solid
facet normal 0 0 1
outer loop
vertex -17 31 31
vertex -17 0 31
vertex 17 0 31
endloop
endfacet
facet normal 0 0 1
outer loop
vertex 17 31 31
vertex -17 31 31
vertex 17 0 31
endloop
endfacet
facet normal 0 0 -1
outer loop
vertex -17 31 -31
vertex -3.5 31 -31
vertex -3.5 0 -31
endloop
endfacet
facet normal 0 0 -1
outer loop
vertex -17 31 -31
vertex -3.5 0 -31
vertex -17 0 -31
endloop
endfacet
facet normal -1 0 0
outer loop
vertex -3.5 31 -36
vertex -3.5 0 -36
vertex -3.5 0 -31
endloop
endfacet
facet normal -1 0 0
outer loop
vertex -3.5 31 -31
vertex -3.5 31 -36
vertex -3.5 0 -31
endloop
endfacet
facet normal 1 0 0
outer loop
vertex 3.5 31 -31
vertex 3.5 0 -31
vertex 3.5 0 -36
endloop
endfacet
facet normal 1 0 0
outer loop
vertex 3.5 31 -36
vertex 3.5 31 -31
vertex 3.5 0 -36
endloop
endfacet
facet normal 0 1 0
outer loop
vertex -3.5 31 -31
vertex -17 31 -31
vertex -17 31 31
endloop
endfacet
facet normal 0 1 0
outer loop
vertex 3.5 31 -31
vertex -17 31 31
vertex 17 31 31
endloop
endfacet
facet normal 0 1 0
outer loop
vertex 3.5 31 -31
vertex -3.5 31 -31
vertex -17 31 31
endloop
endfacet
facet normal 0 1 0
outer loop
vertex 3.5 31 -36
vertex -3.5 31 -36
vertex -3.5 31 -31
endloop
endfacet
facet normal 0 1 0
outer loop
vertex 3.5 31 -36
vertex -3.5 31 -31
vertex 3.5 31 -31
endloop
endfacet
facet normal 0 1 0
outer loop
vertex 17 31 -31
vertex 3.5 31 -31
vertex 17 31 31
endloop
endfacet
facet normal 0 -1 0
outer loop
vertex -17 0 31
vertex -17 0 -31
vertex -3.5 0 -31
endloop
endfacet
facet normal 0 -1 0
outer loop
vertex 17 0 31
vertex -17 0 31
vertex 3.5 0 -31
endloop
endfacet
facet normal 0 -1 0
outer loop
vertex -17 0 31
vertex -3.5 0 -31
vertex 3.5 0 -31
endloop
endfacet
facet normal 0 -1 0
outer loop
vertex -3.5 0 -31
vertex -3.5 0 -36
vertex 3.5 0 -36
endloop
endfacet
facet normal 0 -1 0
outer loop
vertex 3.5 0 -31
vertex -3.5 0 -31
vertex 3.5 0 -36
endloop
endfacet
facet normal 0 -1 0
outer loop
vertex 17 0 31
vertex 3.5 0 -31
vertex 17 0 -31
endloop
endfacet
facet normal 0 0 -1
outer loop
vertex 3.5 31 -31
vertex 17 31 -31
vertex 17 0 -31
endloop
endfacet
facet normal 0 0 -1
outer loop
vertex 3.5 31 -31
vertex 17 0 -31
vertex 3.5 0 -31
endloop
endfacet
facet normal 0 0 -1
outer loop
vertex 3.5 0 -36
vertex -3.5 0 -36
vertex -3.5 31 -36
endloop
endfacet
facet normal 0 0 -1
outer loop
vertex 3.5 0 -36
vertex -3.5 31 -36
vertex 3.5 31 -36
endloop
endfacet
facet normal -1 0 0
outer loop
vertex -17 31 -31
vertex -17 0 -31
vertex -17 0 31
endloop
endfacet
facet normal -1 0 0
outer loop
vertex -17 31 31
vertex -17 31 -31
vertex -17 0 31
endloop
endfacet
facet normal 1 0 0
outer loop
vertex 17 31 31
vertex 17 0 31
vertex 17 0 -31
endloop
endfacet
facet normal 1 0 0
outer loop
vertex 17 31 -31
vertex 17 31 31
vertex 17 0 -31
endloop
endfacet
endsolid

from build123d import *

# Parameters (mm, degrees)
SKETCH1_W           = 7
SKETCH1_H           = 5
BOSS_EXTRUDE1_DEPTH = 31


with BuildPart() as part:
    # Sketch1 → Boss-Extrude1 (new body)
    with BuildSketch(Plane(origin=(0, 0, 0), x_dir=(1, 0, 0), z_dir=(0, 1, 0))):
        with Locations((0, 28.5)):
            Rectangle(SKETCH1_W, SKETCH1_H)
        with Locations((0, 33.5)):
            Rectangle(SKETCH1_W, SKETCH1_H)
        Polygon((-3.5, 31), (-17, 31), (-17, -31), (17, -31), (17, 31), (3.5, 31), (3.5, 26), (-3.5, 26), align=None)
    extrude(amount=BOSS_EXTRUDE1_DEPTH)


solid = part.part
